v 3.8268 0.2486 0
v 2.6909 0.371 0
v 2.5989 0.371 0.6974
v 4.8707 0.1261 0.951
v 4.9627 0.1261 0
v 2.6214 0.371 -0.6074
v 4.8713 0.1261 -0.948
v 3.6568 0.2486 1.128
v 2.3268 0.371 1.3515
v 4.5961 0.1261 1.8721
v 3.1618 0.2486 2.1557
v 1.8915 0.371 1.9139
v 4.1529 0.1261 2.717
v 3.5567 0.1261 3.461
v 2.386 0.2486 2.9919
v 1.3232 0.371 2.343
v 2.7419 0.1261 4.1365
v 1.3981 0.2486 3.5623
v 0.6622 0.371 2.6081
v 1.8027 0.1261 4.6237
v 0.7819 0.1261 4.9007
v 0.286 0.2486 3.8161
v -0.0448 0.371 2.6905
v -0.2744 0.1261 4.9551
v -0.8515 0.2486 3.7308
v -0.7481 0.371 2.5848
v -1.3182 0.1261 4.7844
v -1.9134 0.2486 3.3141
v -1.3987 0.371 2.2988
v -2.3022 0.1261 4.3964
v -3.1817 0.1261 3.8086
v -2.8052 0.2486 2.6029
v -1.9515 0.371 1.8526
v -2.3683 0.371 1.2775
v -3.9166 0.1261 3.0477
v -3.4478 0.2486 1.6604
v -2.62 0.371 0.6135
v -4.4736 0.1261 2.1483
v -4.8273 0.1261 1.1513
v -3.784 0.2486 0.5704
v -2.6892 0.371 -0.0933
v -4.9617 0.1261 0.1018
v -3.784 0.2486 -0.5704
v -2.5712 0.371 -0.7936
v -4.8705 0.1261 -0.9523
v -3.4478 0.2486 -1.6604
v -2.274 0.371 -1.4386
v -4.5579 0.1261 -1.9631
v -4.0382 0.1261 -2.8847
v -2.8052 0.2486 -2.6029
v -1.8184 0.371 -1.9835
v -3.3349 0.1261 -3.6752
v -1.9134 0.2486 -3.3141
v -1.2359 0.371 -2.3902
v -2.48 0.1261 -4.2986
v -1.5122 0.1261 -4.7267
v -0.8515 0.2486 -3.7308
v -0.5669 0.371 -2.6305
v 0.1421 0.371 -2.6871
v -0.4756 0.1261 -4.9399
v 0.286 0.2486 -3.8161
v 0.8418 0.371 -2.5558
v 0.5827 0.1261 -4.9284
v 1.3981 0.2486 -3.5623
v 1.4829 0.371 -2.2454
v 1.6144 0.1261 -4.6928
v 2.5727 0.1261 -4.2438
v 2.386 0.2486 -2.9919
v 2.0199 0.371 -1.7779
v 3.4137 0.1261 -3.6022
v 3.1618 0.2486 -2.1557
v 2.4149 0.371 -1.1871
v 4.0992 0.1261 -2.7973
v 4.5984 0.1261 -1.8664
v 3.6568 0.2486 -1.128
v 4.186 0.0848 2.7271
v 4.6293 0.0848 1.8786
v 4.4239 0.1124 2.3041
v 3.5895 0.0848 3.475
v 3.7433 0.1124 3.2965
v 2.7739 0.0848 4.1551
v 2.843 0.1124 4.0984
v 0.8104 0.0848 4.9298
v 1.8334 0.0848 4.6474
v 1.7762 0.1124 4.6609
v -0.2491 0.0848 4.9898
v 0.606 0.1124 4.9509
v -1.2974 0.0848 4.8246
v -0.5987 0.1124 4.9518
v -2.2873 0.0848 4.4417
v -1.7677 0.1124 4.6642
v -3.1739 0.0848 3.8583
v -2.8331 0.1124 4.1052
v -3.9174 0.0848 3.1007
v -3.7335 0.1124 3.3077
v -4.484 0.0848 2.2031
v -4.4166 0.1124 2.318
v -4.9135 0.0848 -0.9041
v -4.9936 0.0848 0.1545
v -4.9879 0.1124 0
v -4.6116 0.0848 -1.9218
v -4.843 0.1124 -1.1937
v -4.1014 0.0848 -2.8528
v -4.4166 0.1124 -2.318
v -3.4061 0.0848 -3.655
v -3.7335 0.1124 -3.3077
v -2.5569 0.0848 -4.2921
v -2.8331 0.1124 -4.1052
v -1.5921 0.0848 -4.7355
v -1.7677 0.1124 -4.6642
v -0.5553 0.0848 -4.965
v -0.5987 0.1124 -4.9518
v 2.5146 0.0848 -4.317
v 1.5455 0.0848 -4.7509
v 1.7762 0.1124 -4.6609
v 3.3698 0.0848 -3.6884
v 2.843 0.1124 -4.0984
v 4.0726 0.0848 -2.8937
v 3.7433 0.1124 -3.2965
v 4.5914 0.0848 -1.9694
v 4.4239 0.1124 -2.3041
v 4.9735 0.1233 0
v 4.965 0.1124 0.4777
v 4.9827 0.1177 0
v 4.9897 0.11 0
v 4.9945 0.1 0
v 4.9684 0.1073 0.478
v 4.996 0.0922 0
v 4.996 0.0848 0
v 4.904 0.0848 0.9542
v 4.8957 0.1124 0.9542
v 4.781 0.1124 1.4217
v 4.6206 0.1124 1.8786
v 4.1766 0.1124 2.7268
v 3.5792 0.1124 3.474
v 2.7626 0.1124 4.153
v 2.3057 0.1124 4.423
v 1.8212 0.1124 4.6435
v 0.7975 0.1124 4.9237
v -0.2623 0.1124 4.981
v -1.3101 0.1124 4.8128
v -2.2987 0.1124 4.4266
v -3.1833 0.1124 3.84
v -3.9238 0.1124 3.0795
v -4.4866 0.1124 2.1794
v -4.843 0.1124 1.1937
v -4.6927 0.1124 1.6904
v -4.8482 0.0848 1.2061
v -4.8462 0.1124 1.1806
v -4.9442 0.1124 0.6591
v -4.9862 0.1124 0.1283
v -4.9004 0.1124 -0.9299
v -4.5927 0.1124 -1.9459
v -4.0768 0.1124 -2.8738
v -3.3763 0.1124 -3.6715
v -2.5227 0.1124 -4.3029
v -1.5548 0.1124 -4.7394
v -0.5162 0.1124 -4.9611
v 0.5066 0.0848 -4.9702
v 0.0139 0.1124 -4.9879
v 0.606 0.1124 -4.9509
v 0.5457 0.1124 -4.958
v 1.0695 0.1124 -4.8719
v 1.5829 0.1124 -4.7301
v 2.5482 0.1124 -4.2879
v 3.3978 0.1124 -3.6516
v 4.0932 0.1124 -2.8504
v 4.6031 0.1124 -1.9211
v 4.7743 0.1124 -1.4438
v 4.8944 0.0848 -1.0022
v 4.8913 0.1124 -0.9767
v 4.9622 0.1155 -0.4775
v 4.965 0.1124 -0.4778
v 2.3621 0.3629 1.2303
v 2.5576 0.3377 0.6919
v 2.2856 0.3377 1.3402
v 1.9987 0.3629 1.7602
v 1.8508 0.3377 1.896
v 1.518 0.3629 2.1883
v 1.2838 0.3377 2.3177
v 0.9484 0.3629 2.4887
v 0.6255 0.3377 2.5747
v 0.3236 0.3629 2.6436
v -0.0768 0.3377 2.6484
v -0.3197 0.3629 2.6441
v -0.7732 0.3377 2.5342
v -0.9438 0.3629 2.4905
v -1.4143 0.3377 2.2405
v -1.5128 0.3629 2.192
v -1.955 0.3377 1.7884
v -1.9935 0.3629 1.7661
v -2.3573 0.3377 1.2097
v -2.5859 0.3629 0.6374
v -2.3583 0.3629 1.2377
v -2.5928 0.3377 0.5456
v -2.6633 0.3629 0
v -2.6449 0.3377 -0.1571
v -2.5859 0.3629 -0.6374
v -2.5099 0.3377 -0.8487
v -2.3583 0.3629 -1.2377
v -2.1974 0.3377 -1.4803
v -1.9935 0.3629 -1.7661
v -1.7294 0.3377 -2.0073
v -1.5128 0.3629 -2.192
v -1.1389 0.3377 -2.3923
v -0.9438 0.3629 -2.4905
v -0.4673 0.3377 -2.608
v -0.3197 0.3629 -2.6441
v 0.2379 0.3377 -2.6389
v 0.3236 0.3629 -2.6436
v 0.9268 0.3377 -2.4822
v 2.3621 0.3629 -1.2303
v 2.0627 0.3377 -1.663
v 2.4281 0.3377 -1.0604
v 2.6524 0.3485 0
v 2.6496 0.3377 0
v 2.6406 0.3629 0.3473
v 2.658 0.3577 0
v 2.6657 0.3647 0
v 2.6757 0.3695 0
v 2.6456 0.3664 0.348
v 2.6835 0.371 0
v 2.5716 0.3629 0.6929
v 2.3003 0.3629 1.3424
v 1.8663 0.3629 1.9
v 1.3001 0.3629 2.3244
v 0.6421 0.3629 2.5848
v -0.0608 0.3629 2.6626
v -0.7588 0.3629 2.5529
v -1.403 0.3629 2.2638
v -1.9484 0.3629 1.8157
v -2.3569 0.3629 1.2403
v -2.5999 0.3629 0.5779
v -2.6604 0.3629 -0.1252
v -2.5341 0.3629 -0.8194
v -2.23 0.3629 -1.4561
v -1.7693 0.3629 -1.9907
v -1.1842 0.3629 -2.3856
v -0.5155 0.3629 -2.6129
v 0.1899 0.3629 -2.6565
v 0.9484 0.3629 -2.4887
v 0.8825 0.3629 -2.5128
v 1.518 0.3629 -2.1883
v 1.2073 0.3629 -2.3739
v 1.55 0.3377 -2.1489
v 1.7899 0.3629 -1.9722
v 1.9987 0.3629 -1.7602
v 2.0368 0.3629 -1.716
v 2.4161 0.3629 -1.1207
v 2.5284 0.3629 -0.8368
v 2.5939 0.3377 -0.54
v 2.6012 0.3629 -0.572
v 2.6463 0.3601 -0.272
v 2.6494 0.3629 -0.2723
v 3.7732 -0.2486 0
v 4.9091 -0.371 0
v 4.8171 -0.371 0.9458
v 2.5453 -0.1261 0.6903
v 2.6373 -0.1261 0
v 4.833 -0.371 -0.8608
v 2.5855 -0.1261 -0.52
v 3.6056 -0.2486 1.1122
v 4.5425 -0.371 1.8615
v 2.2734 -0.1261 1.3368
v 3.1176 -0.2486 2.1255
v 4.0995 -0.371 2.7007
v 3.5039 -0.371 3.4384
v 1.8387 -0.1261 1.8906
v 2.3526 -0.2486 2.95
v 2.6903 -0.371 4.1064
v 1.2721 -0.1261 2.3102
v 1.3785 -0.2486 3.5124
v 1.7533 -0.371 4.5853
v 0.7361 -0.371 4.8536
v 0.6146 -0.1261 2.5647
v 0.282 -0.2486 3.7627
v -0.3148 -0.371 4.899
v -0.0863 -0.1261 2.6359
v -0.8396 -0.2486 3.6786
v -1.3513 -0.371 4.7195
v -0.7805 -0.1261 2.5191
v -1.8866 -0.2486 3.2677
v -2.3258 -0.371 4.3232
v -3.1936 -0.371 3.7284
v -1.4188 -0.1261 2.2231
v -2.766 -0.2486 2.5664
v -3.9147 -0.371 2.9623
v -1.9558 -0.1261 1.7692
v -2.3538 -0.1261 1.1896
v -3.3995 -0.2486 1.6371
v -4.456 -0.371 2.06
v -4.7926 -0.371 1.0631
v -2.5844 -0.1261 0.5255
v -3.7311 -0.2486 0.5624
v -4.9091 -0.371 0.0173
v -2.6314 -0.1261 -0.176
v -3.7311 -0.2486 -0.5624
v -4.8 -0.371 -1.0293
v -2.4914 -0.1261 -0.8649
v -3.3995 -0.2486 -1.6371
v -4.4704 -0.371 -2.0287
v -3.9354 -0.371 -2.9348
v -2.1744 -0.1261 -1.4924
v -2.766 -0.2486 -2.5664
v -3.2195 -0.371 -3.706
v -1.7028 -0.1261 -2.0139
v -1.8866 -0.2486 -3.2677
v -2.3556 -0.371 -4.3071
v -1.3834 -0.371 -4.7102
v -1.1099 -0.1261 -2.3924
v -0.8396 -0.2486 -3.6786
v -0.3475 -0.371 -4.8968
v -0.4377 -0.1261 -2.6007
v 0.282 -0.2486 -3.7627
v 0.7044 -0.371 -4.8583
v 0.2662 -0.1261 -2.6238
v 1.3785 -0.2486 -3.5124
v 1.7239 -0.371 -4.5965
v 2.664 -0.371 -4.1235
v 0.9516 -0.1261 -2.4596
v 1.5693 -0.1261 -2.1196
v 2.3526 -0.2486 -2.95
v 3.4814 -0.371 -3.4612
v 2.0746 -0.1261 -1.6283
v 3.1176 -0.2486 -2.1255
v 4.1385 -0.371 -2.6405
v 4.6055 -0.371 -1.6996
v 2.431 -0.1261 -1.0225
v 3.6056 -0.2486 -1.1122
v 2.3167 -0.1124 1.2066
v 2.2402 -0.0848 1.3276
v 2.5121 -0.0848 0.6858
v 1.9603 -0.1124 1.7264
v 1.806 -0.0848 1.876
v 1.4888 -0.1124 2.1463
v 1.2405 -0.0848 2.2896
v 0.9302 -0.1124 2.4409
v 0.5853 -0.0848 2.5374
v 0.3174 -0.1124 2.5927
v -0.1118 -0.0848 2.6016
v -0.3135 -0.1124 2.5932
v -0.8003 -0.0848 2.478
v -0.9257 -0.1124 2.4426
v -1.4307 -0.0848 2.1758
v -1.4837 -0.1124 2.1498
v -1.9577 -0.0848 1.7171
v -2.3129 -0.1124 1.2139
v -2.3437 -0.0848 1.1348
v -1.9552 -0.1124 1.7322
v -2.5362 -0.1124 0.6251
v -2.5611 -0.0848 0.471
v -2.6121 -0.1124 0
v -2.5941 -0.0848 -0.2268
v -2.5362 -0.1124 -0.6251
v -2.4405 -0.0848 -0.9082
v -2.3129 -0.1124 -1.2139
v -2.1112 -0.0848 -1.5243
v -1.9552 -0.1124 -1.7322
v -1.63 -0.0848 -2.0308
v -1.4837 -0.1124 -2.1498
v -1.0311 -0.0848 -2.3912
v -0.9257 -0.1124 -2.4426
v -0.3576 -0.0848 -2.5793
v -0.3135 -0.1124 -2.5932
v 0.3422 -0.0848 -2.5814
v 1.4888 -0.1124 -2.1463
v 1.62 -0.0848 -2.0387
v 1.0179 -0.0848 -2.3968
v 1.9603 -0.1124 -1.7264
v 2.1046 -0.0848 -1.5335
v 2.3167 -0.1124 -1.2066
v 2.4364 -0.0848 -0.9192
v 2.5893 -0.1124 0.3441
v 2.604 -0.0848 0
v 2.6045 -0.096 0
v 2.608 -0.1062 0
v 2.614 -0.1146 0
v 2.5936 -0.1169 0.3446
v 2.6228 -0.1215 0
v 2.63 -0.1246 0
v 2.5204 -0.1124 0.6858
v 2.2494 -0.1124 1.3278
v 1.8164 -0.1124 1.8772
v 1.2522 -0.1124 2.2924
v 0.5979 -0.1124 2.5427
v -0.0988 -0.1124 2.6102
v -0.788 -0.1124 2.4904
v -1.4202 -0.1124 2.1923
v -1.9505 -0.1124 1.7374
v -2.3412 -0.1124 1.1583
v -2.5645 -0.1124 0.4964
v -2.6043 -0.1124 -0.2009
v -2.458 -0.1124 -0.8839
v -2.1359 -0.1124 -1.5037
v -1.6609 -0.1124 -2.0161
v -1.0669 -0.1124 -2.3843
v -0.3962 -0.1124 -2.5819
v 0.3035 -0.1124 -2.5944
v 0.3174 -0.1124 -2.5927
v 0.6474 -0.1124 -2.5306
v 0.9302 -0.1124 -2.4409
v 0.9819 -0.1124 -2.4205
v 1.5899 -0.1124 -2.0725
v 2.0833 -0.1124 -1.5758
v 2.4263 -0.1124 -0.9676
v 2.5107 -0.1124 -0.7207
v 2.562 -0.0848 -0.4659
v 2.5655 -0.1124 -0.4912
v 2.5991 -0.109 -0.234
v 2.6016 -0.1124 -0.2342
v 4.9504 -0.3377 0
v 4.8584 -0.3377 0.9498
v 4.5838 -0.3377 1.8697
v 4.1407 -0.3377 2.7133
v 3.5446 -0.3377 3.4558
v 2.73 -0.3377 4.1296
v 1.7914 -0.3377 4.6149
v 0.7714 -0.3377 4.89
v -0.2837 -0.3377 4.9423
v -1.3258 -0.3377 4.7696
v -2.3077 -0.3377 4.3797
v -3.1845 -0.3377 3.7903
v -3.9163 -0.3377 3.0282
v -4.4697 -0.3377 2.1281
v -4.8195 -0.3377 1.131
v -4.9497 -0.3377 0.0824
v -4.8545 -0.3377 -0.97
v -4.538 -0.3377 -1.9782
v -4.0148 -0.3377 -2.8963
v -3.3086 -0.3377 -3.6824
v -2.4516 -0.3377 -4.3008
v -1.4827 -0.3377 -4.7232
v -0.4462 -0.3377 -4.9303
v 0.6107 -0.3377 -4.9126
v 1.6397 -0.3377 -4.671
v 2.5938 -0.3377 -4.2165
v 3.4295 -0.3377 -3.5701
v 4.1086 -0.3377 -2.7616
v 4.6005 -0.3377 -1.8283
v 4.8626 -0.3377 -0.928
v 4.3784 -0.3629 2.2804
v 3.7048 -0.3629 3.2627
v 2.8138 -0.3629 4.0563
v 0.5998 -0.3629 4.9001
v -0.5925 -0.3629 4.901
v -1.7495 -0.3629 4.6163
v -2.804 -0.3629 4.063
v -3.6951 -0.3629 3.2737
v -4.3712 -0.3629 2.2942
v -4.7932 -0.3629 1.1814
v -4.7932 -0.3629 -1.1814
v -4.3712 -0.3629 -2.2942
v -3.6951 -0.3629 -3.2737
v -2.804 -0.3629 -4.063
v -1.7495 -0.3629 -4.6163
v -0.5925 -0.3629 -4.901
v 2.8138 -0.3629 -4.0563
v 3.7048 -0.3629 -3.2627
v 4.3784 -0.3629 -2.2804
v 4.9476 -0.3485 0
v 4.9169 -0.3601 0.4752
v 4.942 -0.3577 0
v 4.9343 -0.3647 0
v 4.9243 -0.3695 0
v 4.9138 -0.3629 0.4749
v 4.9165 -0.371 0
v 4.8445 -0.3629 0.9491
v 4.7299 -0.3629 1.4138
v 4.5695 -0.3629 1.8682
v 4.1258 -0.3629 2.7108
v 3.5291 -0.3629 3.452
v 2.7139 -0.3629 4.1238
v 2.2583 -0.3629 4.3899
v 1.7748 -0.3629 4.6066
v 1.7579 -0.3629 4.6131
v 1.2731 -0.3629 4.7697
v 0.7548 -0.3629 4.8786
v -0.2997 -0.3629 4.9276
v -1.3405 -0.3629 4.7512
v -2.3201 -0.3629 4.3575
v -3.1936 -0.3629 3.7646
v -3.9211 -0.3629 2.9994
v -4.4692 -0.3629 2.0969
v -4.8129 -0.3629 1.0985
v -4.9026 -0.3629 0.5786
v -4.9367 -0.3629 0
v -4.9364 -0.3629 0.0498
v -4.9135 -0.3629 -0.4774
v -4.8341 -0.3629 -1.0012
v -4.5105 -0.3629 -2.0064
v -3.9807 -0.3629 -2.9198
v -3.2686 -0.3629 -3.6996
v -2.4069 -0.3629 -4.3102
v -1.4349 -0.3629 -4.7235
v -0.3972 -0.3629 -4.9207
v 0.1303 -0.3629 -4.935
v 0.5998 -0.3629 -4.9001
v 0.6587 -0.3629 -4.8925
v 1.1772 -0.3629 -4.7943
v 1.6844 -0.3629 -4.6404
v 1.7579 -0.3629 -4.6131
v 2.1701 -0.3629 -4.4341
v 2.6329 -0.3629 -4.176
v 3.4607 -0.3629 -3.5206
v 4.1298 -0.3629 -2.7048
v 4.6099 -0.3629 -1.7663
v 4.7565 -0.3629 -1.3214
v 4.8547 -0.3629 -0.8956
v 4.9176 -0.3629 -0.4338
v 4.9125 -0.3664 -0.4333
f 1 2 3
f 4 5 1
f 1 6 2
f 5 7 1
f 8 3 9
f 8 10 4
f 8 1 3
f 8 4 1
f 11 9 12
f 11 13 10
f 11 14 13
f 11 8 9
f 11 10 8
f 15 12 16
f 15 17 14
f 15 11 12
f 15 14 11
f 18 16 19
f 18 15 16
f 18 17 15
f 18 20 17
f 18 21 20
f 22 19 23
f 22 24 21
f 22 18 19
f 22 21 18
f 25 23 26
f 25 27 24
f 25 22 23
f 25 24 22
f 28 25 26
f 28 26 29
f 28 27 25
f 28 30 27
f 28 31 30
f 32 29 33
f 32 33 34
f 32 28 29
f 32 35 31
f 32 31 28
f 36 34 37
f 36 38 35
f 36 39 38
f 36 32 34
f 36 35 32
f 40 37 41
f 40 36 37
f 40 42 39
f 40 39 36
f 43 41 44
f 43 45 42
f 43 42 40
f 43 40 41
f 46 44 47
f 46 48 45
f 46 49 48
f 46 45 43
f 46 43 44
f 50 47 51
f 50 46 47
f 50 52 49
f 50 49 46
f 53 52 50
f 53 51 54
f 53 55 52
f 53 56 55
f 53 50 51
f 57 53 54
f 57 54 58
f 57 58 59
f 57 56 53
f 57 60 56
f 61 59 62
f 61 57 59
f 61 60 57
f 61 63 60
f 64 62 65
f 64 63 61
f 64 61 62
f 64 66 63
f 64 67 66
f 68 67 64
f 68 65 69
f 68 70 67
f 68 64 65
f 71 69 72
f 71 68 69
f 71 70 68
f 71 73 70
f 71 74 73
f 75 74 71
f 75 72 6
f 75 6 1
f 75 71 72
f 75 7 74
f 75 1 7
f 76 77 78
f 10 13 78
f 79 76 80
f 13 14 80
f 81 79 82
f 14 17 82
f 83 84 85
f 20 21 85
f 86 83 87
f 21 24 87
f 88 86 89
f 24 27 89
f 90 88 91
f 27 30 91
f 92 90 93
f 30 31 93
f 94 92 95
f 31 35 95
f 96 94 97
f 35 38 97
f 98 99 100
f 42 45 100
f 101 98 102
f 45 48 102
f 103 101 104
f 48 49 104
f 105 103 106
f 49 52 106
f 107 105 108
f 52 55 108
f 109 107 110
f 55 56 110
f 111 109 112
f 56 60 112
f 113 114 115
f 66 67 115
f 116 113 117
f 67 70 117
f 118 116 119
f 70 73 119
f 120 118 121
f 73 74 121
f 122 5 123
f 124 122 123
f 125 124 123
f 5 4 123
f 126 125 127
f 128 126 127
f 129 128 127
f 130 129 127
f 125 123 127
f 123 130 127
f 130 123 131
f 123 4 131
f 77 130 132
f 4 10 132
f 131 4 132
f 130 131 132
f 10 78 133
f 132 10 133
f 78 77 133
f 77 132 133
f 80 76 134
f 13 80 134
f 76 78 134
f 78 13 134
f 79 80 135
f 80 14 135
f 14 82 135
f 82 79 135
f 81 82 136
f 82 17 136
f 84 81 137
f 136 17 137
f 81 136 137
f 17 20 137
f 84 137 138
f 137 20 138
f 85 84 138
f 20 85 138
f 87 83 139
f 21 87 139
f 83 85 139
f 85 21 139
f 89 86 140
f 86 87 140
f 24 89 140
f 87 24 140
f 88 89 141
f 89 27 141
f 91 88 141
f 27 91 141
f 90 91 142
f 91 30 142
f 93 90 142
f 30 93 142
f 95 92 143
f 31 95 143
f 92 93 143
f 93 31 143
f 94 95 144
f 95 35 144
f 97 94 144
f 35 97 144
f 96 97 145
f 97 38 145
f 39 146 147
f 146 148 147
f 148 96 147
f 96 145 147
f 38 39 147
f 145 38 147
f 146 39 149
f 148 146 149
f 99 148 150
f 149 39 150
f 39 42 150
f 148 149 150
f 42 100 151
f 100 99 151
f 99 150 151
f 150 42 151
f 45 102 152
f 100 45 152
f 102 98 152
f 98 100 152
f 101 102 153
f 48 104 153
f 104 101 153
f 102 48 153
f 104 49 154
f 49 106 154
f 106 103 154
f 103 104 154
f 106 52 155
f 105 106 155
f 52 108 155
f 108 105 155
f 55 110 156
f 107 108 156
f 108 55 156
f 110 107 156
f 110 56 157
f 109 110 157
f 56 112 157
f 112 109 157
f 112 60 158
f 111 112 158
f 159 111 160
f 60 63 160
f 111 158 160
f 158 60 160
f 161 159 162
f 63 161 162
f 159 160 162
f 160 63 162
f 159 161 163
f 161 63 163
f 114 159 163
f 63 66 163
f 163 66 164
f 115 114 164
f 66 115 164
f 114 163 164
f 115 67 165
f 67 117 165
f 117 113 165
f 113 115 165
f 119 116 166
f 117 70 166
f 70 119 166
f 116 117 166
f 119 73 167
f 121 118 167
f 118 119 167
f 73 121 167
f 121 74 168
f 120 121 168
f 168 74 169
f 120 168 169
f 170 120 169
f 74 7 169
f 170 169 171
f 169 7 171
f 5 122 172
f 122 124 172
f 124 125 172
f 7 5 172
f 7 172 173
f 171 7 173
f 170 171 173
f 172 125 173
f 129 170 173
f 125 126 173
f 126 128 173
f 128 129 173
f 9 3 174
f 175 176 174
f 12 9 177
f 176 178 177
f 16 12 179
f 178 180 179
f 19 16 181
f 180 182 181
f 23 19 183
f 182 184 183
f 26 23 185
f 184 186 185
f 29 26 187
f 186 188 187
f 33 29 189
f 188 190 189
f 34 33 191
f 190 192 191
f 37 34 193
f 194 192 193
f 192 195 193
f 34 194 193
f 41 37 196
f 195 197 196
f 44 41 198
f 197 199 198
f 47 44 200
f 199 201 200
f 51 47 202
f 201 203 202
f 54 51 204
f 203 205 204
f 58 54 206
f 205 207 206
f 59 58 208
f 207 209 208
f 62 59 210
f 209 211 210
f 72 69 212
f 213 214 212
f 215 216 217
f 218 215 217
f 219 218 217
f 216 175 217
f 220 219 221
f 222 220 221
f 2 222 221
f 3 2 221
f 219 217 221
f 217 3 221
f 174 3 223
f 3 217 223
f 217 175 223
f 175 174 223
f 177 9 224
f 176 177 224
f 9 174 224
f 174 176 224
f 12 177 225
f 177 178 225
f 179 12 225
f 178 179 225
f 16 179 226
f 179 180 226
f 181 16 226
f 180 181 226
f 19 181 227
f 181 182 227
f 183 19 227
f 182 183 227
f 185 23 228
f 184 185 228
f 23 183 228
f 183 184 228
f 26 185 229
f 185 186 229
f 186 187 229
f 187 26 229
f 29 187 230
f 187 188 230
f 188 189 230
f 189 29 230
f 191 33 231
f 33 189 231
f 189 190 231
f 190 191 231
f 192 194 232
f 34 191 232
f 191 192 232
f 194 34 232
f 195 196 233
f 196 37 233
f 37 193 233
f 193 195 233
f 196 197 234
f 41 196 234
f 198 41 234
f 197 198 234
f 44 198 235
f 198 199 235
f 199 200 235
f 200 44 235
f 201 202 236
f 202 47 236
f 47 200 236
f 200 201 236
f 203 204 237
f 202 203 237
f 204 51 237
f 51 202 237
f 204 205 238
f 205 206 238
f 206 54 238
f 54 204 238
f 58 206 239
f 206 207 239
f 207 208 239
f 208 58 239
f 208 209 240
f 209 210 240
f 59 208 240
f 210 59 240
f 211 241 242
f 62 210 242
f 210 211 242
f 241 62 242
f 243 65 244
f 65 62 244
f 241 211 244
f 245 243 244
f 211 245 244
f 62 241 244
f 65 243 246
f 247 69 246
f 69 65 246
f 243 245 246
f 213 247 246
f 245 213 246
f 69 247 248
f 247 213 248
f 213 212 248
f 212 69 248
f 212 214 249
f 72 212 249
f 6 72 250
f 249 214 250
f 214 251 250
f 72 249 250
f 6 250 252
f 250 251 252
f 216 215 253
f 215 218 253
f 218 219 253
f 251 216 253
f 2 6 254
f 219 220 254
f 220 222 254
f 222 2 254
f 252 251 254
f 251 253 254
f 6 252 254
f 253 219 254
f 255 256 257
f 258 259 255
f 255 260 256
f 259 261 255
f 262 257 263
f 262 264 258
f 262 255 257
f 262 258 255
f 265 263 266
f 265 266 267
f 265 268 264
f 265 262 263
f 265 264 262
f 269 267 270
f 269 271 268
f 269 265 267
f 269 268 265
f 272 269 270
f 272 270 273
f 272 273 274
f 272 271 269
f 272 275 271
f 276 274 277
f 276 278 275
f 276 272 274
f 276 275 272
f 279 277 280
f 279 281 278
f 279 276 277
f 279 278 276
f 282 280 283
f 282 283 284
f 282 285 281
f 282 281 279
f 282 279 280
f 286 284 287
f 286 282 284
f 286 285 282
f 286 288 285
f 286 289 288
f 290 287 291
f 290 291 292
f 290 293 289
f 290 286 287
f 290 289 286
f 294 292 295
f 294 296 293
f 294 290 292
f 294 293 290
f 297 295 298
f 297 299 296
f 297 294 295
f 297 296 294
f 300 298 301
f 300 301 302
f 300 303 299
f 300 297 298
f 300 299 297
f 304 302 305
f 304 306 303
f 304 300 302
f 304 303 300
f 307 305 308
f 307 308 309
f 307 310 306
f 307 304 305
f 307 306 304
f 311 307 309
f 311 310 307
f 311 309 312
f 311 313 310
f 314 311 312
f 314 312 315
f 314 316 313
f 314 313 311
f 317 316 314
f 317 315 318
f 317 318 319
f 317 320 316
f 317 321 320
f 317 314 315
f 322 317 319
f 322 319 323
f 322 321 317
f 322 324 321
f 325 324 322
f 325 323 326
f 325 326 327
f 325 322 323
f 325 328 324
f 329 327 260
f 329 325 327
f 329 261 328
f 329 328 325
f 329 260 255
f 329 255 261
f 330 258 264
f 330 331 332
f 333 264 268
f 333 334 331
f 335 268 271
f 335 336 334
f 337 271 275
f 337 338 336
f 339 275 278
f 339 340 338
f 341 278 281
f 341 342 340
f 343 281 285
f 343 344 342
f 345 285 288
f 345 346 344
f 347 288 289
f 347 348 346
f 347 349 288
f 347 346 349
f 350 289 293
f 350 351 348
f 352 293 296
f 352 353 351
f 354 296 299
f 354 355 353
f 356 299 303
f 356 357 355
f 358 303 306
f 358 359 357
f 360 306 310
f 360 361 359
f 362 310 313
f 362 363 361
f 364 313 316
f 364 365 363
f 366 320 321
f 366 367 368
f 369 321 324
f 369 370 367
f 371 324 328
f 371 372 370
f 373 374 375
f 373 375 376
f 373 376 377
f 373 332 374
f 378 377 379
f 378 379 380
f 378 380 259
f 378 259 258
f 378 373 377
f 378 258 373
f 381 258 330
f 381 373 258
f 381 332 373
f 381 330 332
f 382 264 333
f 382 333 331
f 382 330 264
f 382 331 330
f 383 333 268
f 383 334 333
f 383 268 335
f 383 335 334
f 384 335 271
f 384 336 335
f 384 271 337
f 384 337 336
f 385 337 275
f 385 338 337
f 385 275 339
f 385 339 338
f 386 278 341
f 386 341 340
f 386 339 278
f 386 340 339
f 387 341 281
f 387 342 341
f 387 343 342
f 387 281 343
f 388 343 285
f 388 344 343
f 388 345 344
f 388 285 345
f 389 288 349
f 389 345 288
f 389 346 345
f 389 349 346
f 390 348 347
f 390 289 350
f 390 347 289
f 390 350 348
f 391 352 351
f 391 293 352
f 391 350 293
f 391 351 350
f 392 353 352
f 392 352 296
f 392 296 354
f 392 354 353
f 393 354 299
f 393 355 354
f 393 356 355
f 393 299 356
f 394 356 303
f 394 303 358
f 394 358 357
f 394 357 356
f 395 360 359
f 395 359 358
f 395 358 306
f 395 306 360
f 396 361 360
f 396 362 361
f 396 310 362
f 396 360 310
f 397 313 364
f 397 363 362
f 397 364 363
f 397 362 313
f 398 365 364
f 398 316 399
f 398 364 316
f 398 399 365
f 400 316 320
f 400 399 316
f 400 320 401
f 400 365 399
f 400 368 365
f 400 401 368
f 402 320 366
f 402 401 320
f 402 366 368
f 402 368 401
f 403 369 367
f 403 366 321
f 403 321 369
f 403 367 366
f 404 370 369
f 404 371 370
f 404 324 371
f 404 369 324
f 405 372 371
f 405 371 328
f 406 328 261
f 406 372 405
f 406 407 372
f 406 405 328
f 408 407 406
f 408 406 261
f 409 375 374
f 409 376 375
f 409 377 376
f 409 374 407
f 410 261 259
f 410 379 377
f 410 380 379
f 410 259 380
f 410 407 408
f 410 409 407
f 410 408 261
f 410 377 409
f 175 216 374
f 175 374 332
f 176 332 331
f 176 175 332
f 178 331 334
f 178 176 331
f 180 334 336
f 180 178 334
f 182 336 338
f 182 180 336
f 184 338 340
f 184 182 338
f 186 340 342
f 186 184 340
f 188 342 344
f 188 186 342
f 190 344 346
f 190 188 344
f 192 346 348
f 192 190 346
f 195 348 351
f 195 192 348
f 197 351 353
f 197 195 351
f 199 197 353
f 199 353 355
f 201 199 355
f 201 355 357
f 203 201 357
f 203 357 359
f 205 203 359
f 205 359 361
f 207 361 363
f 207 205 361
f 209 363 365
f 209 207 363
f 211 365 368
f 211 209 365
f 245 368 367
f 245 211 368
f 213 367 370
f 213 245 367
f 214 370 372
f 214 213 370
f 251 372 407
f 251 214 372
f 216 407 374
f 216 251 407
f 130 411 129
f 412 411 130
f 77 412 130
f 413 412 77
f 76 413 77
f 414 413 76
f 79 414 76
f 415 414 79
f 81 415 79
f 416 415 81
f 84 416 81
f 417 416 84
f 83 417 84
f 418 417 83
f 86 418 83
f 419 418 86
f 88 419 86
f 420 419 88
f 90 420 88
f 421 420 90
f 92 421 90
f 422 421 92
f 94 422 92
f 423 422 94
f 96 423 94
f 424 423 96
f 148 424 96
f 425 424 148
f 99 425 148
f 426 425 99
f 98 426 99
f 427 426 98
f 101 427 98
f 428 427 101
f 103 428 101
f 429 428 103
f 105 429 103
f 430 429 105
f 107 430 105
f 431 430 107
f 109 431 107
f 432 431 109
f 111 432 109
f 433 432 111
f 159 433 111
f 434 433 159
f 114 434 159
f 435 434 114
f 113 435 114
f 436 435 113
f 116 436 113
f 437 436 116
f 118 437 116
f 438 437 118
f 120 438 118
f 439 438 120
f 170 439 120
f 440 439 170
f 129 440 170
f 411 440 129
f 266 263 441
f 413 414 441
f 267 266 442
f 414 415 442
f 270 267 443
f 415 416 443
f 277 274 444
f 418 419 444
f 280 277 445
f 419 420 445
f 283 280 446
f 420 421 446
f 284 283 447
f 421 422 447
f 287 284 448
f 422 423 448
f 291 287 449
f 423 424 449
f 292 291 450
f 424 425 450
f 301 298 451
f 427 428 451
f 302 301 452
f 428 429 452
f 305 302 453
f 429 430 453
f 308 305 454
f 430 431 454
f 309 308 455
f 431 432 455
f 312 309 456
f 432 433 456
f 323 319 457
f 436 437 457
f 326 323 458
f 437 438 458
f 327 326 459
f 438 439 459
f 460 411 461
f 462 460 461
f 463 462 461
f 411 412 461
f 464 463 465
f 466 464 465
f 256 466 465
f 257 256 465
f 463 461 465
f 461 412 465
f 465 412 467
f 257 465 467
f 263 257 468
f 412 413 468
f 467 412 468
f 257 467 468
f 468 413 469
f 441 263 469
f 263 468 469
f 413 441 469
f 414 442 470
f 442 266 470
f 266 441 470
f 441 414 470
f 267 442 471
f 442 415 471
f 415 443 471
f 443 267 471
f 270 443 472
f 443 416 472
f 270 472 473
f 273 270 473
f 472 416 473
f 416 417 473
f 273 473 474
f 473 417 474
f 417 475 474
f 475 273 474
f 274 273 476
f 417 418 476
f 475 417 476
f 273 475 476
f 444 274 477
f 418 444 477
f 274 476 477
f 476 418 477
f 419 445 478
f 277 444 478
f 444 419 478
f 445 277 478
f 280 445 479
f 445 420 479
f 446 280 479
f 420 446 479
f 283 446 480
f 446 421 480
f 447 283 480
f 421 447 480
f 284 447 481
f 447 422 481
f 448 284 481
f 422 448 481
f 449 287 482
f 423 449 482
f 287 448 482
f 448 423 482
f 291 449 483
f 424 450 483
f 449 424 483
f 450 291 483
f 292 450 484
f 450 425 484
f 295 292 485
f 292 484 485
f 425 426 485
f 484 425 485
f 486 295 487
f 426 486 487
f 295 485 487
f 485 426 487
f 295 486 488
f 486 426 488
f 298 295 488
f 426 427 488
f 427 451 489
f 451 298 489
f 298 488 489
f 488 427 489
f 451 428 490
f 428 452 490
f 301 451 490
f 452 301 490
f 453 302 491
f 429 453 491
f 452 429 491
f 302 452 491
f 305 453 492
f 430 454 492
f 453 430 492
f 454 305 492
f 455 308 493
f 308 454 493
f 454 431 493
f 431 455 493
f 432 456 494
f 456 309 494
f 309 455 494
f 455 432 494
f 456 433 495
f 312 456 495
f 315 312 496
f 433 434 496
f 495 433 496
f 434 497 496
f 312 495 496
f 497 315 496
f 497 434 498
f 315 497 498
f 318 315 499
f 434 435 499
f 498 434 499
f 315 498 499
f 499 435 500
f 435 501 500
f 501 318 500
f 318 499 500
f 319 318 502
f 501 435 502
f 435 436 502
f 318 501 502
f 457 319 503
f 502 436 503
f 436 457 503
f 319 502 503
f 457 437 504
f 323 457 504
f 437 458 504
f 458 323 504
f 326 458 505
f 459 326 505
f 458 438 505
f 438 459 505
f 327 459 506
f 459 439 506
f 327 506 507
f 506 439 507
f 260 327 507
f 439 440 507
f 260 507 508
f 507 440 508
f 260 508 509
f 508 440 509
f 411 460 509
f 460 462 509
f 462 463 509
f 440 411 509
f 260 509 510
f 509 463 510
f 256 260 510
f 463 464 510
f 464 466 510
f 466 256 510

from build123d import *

# Parameters (mm, degrees)
FILLET1_R = 0.0375


with BuildPart() as part:
    # Sketch2 → Revolve1 (revolve)
    with BuildSketch(Plane.XY):
        Polygon((2.6, -0.122121355), (2.653575722, 0.375), (5, 0.122121355), (4.946424278, -0.375), align=None)
    revolve(axis=Axis((0, 0.375, 0), (0, -1, 0)))

    # Fillet1
    fillet1_edges = [part.edges().sort_by_distance(p)[0] for p in [
        (-4.946424278, -0.375, 0),
        (-5, 0.122121355, 0),
        (-2.653575722, 0.375, 0),
        (-2.6, -0.122121355, 0),
    ]]
    fillet(fillet1_edges, radius=FILLET1_R)


solid = part.part
